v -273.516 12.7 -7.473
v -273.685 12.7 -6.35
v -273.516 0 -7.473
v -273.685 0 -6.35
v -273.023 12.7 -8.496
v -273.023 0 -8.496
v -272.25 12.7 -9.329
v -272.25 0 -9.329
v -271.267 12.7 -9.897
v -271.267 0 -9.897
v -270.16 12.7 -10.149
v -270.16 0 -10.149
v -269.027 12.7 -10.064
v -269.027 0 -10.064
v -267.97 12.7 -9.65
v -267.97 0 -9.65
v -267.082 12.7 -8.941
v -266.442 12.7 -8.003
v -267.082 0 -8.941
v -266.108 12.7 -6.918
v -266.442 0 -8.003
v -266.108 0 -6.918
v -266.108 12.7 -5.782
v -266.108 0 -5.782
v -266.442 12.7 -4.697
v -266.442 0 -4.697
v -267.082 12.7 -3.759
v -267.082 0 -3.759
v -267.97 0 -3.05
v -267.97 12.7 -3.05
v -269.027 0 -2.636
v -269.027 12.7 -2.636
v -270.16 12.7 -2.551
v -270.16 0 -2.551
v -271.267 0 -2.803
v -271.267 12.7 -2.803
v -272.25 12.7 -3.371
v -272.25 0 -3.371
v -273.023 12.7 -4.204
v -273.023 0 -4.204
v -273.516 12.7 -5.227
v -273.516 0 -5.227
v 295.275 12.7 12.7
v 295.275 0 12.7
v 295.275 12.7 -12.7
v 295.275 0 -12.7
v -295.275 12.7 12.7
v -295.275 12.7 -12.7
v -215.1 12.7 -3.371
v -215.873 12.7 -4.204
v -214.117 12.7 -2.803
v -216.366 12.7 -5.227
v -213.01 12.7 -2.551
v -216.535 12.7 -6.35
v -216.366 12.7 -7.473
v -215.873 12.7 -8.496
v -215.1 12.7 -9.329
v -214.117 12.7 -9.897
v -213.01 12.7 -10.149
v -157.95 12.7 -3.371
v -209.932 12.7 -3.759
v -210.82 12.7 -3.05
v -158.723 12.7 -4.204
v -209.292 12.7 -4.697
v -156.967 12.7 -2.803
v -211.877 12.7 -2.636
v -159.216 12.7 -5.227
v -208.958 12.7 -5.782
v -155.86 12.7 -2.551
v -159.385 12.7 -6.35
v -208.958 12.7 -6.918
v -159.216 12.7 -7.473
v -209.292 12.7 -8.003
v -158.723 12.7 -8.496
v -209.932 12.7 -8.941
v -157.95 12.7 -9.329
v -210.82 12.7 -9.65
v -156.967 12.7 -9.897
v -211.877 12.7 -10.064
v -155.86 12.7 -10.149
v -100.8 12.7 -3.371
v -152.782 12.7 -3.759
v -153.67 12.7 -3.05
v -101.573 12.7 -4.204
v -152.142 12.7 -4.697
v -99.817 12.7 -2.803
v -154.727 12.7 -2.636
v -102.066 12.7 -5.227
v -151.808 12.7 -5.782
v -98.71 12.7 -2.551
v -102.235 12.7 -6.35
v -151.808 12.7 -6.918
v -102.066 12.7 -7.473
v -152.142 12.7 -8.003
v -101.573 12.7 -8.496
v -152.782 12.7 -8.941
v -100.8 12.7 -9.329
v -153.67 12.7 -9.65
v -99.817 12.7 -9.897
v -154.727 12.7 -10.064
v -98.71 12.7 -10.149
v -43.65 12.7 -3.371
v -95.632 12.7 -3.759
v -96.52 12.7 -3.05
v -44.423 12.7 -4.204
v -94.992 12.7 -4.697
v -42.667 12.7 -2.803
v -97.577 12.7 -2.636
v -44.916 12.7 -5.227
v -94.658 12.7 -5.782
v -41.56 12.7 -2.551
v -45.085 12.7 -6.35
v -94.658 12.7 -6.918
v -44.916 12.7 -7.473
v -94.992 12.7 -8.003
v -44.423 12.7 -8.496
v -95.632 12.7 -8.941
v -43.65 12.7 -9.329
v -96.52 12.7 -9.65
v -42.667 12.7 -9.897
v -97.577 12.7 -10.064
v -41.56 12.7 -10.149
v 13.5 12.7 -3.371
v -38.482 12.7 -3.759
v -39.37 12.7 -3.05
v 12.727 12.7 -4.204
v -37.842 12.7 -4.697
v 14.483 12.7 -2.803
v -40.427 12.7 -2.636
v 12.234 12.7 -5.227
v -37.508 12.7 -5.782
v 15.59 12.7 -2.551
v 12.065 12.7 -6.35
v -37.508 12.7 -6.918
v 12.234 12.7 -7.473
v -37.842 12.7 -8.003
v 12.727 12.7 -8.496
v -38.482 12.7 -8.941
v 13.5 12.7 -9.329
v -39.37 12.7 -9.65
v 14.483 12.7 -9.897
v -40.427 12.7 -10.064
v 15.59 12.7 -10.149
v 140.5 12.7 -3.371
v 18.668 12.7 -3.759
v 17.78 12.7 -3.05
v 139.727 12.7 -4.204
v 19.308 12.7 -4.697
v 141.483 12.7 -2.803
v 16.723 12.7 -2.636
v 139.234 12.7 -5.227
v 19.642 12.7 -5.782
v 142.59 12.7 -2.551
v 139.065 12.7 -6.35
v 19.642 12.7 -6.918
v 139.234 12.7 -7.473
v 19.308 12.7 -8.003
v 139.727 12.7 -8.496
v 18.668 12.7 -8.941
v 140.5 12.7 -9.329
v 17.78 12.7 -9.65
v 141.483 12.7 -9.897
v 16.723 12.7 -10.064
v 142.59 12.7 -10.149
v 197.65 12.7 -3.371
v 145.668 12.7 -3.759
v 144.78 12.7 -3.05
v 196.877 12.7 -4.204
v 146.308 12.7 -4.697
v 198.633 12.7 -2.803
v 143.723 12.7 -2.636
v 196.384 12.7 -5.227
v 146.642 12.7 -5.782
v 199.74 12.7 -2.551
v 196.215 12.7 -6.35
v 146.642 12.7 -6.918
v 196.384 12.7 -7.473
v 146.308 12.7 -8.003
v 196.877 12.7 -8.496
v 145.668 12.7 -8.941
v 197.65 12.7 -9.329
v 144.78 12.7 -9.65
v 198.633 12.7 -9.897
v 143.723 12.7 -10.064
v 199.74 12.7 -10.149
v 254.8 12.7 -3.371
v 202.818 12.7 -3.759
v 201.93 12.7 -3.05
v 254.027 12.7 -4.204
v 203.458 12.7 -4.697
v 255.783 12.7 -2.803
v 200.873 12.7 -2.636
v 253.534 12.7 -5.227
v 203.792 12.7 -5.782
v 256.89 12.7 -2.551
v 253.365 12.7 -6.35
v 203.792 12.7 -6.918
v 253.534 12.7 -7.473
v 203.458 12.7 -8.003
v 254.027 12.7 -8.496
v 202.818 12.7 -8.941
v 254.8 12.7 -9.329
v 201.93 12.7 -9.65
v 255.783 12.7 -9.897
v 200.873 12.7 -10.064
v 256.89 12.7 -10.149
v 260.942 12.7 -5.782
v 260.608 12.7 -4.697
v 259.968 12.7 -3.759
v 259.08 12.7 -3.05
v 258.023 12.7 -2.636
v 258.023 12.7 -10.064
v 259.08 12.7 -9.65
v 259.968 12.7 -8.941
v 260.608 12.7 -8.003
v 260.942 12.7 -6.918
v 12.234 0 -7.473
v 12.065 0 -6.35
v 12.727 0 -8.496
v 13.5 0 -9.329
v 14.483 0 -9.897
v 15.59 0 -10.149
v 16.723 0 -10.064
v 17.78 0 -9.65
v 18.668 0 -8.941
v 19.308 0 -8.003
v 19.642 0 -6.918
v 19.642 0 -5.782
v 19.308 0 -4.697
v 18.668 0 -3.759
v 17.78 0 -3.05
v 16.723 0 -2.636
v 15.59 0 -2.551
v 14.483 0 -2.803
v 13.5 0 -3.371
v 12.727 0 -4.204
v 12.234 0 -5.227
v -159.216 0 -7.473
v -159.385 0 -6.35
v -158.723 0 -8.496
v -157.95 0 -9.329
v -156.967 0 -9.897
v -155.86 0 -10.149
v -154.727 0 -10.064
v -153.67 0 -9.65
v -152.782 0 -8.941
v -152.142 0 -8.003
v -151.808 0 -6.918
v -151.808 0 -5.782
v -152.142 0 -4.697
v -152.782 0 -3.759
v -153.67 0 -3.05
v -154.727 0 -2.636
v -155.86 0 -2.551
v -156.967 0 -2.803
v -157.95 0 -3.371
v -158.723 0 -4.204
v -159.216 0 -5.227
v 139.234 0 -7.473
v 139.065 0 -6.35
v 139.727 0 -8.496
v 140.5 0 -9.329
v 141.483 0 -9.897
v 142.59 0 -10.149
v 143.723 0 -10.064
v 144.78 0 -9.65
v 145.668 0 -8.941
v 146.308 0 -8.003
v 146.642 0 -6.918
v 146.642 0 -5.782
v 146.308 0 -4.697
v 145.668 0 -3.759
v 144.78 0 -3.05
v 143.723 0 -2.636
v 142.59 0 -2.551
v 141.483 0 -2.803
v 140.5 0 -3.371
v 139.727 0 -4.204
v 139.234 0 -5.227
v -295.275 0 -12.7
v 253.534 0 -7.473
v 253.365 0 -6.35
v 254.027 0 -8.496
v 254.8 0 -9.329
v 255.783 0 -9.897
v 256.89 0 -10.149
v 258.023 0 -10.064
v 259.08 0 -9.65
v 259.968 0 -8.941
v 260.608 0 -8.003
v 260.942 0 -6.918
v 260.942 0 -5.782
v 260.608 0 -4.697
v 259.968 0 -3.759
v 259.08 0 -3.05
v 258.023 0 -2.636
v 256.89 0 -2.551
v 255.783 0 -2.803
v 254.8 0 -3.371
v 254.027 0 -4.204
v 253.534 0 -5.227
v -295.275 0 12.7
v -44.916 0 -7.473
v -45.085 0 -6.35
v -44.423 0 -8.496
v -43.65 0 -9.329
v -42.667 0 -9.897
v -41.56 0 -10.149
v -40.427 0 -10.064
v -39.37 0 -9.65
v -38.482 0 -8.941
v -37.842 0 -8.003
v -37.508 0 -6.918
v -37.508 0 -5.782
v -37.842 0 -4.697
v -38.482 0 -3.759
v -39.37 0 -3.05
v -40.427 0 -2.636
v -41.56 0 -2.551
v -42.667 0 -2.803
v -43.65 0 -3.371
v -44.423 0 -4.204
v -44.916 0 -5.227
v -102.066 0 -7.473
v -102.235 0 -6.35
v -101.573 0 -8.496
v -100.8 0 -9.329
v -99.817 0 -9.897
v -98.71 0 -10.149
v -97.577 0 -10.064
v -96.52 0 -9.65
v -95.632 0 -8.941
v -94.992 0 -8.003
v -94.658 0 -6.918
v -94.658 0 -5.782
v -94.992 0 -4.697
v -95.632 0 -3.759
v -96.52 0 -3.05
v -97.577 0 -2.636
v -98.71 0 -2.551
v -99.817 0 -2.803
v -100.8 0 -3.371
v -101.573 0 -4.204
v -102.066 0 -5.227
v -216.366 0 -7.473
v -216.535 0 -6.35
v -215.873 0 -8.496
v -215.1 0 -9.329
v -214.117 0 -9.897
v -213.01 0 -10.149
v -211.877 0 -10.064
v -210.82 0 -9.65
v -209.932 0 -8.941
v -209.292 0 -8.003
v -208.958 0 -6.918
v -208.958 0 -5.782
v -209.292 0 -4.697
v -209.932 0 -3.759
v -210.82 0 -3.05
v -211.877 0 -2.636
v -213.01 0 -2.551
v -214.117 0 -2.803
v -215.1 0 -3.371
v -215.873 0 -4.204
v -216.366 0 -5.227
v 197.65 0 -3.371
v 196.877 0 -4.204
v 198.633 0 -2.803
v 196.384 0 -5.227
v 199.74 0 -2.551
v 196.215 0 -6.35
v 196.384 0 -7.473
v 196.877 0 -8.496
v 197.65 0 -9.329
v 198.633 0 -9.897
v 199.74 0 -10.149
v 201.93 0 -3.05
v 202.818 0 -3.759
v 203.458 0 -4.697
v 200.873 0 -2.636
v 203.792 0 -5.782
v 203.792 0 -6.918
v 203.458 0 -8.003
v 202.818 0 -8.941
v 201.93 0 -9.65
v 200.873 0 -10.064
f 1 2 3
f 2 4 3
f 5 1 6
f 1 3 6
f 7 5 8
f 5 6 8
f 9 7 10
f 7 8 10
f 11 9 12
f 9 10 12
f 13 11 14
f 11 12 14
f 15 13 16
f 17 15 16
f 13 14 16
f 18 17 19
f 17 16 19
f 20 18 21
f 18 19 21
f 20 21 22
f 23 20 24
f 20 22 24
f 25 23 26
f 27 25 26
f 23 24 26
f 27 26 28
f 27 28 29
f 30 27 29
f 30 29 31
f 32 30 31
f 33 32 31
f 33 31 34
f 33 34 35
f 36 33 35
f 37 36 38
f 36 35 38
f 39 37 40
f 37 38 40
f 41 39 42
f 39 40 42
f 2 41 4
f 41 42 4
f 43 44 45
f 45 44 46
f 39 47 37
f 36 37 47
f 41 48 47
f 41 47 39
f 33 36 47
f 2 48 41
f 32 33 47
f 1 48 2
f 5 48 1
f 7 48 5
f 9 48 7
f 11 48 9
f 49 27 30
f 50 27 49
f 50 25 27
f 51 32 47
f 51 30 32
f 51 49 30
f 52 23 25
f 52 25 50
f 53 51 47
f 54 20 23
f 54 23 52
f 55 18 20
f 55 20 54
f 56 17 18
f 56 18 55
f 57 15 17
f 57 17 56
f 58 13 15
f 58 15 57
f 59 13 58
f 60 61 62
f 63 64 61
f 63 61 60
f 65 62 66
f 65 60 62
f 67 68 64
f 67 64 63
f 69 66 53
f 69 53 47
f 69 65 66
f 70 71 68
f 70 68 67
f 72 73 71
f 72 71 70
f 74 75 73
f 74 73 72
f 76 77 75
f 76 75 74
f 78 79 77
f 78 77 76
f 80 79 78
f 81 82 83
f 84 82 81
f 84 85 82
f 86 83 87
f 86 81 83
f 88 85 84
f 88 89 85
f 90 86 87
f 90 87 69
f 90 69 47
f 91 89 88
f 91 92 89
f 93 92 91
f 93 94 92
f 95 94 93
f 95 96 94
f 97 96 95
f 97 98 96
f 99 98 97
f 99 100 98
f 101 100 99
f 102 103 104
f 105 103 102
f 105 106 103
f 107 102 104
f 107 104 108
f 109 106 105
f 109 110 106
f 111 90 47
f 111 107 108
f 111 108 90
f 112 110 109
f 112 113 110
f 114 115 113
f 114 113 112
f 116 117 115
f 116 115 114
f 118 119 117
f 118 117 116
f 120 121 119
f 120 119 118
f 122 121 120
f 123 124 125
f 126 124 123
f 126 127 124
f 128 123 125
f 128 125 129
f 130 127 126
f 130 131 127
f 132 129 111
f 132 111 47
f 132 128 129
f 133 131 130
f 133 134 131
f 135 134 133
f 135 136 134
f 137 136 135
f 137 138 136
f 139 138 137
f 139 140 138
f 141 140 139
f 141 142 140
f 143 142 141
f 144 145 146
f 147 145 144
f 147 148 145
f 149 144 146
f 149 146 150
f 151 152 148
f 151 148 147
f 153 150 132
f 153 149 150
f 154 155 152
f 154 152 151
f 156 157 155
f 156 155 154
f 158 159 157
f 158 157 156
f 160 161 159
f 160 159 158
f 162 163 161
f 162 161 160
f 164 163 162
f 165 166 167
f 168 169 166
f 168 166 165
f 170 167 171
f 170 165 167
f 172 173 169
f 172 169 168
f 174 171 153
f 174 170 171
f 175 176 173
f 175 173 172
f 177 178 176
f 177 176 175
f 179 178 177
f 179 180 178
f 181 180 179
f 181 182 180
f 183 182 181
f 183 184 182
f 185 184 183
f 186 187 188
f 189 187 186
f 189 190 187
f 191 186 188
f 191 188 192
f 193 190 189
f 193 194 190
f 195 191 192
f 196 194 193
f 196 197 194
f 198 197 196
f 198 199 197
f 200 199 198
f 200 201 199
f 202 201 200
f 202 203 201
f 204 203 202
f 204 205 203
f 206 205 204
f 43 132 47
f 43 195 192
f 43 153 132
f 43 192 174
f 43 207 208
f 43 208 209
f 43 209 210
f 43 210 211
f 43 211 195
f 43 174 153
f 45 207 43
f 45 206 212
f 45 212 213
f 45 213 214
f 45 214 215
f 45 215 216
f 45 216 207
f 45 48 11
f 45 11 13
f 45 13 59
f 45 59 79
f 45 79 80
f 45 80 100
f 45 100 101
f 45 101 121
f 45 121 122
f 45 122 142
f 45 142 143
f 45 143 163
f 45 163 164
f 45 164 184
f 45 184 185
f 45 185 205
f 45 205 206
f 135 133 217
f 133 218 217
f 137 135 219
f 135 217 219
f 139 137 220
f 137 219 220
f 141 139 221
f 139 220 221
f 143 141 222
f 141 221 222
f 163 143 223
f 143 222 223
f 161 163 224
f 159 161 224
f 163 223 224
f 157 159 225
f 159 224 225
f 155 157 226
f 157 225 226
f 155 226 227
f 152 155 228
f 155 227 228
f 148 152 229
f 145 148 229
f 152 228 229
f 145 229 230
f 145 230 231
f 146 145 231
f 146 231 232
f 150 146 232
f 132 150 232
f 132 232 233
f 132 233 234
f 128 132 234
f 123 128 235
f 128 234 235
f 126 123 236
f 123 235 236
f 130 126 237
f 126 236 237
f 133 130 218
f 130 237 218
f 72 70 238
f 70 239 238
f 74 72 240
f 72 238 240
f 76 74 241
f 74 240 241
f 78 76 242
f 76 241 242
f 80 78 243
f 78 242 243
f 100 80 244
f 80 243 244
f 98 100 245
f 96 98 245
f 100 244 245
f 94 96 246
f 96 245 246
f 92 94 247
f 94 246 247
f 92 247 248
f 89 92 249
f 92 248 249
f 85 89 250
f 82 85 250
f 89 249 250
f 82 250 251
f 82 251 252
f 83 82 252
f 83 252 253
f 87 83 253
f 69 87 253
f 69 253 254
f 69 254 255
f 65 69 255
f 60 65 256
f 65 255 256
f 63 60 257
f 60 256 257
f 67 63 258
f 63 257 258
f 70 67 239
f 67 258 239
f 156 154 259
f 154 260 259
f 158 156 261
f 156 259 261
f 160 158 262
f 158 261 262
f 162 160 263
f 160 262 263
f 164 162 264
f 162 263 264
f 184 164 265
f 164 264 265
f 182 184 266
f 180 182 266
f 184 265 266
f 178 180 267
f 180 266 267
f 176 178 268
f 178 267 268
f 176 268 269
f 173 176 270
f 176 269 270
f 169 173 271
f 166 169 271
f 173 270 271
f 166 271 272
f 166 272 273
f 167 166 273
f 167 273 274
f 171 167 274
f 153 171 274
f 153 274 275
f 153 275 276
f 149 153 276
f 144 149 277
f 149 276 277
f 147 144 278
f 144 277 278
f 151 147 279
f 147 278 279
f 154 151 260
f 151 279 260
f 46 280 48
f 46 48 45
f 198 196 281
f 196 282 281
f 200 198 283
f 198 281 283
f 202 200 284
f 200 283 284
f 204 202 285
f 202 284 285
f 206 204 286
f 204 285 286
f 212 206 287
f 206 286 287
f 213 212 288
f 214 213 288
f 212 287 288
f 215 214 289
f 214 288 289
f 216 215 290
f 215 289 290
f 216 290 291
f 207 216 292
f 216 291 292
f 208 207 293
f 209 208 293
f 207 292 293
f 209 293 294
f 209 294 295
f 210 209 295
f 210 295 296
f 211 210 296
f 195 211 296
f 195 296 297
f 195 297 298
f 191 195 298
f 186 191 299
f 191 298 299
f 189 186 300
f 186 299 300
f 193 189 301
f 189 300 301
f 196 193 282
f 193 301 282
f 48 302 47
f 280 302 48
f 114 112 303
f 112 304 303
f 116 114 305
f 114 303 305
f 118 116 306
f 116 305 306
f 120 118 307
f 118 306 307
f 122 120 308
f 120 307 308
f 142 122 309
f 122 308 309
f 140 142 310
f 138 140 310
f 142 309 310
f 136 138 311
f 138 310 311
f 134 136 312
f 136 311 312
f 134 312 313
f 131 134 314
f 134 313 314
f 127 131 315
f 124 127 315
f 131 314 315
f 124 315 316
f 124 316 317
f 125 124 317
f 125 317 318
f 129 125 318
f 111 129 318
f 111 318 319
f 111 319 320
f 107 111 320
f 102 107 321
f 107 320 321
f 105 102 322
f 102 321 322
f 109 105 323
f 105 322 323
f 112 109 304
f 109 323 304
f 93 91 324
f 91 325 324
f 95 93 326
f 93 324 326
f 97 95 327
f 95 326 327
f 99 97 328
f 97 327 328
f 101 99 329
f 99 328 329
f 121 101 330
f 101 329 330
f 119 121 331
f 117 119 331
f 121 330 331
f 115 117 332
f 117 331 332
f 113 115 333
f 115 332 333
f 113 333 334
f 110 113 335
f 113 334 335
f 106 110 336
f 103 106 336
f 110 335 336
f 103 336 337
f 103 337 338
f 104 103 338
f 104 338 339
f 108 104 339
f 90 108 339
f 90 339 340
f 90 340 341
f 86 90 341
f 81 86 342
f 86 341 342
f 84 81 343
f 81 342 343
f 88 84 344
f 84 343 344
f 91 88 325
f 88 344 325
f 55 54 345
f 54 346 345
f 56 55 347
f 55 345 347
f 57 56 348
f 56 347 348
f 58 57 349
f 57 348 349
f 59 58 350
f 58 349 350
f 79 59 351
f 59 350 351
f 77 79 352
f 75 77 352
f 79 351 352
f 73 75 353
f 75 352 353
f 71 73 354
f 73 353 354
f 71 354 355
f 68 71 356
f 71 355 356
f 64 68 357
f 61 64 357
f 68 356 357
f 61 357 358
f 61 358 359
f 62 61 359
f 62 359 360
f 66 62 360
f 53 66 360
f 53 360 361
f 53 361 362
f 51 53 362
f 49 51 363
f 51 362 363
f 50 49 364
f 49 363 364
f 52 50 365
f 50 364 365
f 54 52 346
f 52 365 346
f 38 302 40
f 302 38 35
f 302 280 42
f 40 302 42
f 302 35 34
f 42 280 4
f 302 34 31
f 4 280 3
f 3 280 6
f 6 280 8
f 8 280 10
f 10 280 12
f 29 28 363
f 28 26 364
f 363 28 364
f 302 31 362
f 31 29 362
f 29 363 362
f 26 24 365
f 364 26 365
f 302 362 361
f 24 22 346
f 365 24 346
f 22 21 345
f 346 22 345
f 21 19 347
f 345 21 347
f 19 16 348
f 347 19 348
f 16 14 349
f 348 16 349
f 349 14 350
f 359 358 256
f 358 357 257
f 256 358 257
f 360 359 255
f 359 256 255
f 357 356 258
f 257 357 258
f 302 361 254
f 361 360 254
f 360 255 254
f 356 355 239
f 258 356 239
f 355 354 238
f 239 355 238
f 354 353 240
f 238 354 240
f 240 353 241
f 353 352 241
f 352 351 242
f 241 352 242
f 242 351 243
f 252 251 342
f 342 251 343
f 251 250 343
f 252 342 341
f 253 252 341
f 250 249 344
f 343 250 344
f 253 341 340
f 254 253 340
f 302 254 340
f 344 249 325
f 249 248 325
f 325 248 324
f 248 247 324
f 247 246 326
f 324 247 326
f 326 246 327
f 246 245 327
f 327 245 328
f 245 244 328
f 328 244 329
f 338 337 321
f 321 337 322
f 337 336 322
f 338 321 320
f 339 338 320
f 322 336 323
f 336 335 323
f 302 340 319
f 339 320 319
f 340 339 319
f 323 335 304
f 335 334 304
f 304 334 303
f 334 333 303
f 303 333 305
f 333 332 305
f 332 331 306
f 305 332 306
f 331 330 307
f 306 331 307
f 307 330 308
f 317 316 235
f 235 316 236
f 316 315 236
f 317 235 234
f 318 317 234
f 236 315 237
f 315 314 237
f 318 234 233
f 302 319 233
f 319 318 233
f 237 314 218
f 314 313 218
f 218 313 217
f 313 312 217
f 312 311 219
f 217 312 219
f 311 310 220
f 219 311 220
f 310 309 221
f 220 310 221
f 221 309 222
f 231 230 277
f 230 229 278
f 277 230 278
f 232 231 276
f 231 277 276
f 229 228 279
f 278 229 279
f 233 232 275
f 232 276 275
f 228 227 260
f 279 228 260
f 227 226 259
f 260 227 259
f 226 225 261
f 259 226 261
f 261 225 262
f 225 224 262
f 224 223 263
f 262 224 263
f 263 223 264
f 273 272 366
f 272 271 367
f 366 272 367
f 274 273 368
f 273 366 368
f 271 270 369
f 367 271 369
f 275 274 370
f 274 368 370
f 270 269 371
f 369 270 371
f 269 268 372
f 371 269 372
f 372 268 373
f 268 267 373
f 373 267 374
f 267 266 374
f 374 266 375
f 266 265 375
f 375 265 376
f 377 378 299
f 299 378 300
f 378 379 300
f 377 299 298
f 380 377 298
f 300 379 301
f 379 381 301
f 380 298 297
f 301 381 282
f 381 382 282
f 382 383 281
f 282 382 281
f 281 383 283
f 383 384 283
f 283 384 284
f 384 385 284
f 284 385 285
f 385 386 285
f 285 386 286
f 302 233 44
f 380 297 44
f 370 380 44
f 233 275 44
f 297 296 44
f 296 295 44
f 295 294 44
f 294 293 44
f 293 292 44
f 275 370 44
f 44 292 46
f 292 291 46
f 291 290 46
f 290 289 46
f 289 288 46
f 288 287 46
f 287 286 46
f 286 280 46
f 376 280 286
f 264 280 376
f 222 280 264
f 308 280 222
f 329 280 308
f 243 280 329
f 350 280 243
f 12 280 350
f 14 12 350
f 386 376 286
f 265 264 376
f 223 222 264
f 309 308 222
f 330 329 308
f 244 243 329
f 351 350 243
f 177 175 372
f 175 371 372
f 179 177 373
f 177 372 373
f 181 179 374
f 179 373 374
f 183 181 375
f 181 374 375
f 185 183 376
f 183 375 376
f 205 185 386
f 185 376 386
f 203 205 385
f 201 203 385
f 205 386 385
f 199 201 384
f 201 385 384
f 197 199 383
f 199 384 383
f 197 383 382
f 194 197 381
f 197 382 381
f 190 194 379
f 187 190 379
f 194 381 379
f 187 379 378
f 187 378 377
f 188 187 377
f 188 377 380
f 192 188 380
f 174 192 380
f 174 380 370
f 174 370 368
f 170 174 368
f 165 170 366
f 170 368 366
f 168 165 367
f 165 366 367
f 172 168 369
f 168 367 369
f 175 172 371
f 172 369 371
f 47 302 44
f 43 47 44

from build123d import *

# Parameters (mm, degrees)
SKETCH1_W                     = 590.55
SKETCH1_H                     = 25.4
BOSS_EXTRUDE1_DEPTH           = 12.7
F_94_0_3_DIAMETER_HOLE1_D     = 7.62
F_94_0_3_DIAMETER_HOLE1_DEPTH = 12.7
F_94_0_3_DIAMETER_HOLE1_TIP   = 2.289278958


with BuildPart() as part:
    # Sketch1 → Boss-Extrude1 (new body)
    with BuildSketch(Plane(origin=(0, 0, 0), x_dir=(1, 0, 0), z_dir=(0, 1, 0))):
        Rectangle(SKETCH1_W, SKETCH1_H)
    extrude(amount=BOSS_EXTRUDE1_DEPTH)

    # #94 (0.3) Diameter Hole1
    with Locations(Plane(origin=(0, 12.7, 0), x_dir=(1, 0, 0), z_dir=(0, 1, 0))):
        with Locations((-269.875, 6.35), (-212.725, 6.35), (142.875, 6.35), (-155.575, 6.35), (-98.425, 6.35), (-41.275, 6.35), (15.875, 6.35), (200.025, 6.35), (257.175, 6.35)):
            Hole(F_94_0_3_DIAMETER_HOLE1_D / 2, depth=F_94_0_3_DIAMETER_HOLE1_DEPTH)
            with Locations((0, 0, -(F_94_0_3_DIAMETER_HOLE1_DEPTH + F_94_0_3_DIAMETER_HOLE1_TIP / 2))):  # 118° drill point
                Cone(0, F_94_0_3_DIAMETER_HOLE1_D / 2, F_94_0_3_DIAMETER_HOLE1_TIP, mode=Mode.SUBTRACT)


solid = part.part
